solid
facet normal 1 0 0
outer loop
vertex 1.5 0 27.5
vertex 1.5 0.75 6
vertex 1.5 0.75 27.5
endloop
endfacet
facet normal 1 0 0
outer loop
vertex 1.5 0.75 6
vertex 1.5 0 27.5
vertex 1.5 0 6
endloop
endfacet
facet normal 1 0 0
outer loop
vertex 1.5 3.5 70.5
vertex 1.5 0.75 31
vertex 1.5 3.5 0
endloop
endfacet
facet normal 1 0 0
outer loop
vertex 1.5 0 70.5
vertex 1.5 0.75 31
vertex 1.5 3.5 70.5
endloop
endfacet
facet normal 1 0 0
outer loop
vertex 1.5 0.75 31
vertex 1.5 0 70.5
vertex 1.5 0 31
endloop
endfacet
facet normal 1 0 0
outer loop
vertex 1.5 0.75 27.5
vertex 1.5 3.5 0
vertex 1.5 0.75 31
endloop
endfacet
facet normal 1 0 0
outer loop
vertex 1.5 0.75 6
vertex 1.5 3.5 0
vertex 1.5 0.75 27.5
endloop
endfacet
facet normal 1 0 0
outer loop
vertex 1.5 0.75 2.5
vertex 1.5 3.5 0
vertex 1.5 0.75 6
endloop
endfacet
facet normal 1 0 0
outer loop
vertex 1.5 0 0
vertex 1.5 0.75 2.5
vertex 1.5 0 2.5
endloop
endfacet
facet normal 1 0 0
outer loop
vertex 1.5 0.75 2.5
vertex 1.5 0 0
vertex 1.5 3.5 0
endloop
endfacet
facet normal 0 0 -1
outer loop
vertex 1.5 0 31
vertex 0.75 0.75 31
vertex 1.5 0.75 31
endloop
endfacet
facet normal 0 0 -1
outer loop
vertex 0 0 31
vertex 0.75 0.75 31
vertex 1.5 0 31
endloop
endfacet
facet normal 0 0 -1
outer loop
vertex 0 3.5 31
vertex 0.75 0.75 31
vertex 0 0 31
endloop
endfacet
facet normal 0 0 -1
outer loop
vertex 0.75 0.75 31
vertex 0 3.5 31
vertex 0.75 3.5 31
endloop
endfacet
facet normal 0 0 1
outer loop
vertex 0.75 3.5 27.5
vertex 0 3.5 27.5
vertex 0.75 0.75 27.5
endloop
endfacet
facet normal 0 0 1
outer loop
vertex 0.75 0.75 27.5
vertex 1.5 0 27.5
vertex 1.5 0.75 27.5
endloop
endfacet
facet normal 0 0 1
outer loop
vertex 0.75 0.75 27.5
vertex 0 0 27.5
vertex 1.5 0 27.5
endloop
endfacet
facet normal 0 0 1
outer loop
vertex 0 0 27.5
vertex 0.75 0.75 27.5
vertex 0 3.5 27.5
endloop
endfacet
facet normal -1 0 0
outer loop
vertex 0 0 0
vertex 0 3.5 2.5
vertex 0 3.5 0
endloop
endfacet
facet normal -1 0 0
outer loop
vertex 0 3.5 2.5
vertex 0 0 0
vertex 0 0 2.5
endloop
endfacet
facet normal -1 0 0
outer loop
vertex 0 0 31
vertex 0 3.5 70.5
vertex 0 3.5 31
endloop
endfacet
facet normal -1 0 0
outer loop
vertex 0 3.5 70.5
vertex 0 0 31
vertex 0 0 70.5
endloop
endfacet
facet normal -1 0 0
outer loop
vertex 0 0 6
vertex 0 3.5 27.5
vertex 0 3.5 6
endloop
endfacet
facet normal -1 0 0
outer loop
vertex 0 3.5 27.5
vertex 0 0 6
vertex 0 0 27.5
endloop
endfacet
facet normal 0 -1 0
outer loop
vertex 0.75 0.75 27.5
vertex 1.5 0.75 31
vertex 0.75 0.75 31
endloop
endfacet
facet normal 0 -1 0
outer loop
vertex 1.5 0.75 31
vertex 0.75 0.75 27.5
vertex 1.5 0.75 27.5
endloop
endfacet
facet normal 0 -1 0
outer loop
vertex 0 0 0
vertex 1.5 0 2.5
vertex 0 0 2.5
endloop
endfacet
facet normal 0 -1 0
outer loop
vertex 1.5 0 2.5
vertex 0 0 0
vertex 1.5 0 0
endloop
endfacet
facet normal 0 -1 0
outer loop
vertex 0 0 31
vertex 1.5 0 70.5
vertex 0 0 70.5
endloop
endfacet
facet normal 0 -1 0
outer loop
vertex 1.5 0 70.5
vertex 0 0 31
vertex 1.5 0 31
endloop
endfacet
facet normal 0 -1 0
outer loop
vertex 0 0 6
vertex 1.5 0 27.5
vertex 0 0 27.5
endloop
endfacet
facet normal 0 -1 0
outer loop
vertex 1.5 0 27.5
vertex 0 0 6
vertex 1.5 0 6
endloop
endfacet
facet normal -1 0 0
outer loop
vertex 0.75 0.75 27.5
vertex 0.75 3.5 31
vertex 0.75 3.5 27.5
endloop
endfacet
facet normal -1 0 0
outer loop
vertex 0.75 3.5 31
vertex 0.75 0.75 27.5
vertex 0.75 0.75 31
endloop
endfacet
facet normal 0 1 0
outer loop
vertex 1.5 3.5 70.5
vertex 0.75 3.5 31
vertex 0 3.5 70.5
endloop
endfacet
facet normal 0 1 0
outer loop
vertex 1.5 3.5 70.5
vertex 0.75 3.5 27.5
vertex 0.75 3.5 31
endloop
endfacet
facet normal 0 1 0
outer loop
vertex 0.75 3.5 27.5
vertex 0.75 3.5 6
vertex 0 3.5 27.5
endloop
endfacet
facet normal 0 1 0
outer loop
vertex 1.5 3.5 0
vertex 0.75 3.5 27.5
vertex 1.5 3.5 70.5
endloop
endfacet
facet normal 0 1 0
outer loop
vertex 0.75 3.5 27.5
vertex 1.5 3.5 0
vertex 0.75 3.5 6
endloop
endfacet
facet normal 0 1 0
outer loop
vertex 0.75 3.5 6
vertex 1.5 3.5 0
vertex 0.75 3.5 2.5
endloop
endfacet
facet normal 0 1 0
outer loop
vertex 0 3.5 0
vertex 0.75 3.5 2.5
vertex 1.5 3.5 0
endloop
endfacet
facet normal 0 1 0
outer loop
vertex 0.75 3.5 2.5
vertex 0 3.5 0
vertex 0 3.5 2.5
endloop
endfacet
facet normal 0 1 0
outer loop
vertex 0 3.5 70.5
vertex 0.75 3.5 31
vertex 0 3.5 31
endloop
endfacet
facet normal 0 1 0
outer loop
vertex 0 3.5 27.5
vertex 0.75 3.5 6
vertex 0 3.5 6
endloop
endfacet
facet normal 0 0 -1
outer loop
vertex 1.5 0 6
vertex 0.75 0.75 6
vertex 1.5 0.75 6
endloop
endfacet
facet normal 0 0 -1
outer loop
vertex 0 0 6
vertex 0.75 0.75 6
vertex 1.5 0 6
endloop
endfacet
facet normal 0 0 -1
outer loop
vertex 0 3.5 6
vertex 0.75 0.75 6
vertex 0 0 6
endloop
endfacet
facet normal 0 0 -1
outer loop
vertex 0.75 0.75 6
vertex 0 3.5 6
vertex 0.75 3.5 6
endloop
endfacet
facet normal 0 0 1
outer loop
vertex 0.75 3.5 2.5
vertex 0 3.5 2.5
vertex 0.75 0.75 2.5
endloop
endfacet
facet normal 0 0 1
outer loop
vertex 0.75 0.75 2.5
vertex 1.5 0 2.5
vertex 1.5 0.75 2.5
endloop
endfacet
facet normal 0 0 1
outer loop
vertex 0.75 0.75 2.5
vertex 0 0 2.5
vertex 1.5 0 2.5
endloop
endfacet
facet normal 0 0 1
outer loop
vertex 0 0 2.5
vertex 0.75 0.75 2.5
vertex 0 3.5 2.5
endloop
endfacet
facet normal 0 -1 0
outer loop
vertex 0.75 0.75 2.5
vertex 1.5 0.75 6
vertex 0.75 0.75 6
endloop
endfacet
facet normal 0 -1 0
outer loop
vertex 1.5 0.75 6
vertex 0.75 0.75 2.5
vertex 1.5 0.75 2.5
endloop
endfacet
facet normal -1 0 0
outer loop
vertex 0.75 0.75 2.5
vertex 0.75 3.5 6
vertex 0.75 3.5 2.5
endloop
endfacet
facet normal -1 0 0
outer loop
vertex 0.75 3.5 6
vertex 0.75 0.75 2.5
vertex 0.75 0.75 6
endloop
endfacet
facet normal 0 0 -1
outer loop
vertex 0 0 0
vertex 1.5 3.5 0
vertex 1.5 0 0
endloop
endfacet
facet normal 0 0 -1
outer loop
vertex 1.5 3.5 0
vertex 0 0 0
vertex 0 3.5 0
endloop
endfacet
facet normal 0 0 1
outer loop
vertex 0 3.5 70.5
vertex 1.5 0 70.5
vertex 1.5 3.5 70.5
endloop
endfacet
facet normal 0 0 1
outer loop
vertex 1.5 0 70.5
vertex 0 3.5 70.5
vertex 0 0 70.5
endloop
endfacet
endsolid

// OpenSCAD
// file: ../config.scad
// height of desktop and shelves
desktop_shelf_color="Sienna";
desktop_height=31;
desktop_thickness=0.75;
table_width=96;
table_depth=36;
shelf_thickness=0.5;
shelf_height=6;
top_shelf_height=72.5;
hutch_shelf_height=50;
left_lower_shelf_height=22;
left_lower_shelf_thickness=0.25;

// Legs
front_leg_length=desktop_height;
rear_leg_length=top_shelf_height-shelf_thickness;
leg_timber_width=1.5;
leg_timber_depth=3.5;
center_leg_timber_width=1.5;
center_leg_timber_depth=3.5;
center_leg_setback=24;

// Parts Shelves
parts_shelf_thickness = 0.35;
parts_shelf_spacing = 0.15;
parts_plate_thickness = 0.2;
parts_support_depth = 0.25;
parts_shelf_depth = 11;
parts_support_height = 11;
parts_shelf_width = (table_width/4)-(center_leg_timber_width*2)-(parts_plate_thickness*2);

// Plates
strut_timber_depth=1.5;
strut_timber_height=3.5;
top_shelf_timber_depth=3.5;
top_shelf_timber_height=1.5;
// file: ../components/leg_NOTcenter_NOTinner_NOTleft.scad
module leg_NOTcenter_NOTinner_NOTleft()
{
    include <../config.scad>
    leg_length = rear_leg_length;
    echo(str("BOM ITEM: leg_NOTcenter_NOTinner_NOTleft"));
    render() { // see note in README about rendering
        difference() {
            cube([leg_timber_width,leg_timber_depth,leg_length],false);

            // Top rabbets
            translate([0,0,desktop_height-strut_timber_height])
            {
                // rabbet cut on short side
                translate([0,(leg_timber_width-strut_timber_depth),0]){
                    cube([leg_timber_width,strut_timber_depth/2,strut_timber_height],false);
                }
                cube([strut_timber_depth/2,leg_timber_depth,strut_timber_height],false);
            }

            // Bottom rabbets
            translate([0,0,shelf_height-strut_timber_height])
            {
                // rabbet cut on short side
                translate([0,(leg_timber_width-strut_timber_depth),0]){
                    cube([leg_timber_width,strut_timber_depth/2,strut_timber_height],false);
                }
                cube([strut_timber_depth/2,leg_timber_depth,strut_timber_height],false);
            }

            // rear and center legs only
            if(top_shelf_timber_height >= top_shelf_timber_depth) {
              // Upper shelf rabbets for back/middle legs
              translate([0,0,leg_length-top_shelf_timber_height]){
                cube([top_shelf_timber_depth/2,leg_timber_depth,top_shelf_timber_height],false);
                cube([leg_timber_width,top_shelf_timber_depth/2,top_shelf_timber_height],false);
              }
            } else {
              // Upper shelf rabbets for back/middle legs
              translate([0,0,leg_length-top_shelf_timber_height]){
                cube([leg_timber_width,leg_timber_depth,top_shelf_timber_height],false);
              }
            }
        }
    }
}
// main file
use <../components/leg_NOTcenter_NOTinner_NOTleft.scad>

leg_NOTcenter_NOTinner_NOTleft();
